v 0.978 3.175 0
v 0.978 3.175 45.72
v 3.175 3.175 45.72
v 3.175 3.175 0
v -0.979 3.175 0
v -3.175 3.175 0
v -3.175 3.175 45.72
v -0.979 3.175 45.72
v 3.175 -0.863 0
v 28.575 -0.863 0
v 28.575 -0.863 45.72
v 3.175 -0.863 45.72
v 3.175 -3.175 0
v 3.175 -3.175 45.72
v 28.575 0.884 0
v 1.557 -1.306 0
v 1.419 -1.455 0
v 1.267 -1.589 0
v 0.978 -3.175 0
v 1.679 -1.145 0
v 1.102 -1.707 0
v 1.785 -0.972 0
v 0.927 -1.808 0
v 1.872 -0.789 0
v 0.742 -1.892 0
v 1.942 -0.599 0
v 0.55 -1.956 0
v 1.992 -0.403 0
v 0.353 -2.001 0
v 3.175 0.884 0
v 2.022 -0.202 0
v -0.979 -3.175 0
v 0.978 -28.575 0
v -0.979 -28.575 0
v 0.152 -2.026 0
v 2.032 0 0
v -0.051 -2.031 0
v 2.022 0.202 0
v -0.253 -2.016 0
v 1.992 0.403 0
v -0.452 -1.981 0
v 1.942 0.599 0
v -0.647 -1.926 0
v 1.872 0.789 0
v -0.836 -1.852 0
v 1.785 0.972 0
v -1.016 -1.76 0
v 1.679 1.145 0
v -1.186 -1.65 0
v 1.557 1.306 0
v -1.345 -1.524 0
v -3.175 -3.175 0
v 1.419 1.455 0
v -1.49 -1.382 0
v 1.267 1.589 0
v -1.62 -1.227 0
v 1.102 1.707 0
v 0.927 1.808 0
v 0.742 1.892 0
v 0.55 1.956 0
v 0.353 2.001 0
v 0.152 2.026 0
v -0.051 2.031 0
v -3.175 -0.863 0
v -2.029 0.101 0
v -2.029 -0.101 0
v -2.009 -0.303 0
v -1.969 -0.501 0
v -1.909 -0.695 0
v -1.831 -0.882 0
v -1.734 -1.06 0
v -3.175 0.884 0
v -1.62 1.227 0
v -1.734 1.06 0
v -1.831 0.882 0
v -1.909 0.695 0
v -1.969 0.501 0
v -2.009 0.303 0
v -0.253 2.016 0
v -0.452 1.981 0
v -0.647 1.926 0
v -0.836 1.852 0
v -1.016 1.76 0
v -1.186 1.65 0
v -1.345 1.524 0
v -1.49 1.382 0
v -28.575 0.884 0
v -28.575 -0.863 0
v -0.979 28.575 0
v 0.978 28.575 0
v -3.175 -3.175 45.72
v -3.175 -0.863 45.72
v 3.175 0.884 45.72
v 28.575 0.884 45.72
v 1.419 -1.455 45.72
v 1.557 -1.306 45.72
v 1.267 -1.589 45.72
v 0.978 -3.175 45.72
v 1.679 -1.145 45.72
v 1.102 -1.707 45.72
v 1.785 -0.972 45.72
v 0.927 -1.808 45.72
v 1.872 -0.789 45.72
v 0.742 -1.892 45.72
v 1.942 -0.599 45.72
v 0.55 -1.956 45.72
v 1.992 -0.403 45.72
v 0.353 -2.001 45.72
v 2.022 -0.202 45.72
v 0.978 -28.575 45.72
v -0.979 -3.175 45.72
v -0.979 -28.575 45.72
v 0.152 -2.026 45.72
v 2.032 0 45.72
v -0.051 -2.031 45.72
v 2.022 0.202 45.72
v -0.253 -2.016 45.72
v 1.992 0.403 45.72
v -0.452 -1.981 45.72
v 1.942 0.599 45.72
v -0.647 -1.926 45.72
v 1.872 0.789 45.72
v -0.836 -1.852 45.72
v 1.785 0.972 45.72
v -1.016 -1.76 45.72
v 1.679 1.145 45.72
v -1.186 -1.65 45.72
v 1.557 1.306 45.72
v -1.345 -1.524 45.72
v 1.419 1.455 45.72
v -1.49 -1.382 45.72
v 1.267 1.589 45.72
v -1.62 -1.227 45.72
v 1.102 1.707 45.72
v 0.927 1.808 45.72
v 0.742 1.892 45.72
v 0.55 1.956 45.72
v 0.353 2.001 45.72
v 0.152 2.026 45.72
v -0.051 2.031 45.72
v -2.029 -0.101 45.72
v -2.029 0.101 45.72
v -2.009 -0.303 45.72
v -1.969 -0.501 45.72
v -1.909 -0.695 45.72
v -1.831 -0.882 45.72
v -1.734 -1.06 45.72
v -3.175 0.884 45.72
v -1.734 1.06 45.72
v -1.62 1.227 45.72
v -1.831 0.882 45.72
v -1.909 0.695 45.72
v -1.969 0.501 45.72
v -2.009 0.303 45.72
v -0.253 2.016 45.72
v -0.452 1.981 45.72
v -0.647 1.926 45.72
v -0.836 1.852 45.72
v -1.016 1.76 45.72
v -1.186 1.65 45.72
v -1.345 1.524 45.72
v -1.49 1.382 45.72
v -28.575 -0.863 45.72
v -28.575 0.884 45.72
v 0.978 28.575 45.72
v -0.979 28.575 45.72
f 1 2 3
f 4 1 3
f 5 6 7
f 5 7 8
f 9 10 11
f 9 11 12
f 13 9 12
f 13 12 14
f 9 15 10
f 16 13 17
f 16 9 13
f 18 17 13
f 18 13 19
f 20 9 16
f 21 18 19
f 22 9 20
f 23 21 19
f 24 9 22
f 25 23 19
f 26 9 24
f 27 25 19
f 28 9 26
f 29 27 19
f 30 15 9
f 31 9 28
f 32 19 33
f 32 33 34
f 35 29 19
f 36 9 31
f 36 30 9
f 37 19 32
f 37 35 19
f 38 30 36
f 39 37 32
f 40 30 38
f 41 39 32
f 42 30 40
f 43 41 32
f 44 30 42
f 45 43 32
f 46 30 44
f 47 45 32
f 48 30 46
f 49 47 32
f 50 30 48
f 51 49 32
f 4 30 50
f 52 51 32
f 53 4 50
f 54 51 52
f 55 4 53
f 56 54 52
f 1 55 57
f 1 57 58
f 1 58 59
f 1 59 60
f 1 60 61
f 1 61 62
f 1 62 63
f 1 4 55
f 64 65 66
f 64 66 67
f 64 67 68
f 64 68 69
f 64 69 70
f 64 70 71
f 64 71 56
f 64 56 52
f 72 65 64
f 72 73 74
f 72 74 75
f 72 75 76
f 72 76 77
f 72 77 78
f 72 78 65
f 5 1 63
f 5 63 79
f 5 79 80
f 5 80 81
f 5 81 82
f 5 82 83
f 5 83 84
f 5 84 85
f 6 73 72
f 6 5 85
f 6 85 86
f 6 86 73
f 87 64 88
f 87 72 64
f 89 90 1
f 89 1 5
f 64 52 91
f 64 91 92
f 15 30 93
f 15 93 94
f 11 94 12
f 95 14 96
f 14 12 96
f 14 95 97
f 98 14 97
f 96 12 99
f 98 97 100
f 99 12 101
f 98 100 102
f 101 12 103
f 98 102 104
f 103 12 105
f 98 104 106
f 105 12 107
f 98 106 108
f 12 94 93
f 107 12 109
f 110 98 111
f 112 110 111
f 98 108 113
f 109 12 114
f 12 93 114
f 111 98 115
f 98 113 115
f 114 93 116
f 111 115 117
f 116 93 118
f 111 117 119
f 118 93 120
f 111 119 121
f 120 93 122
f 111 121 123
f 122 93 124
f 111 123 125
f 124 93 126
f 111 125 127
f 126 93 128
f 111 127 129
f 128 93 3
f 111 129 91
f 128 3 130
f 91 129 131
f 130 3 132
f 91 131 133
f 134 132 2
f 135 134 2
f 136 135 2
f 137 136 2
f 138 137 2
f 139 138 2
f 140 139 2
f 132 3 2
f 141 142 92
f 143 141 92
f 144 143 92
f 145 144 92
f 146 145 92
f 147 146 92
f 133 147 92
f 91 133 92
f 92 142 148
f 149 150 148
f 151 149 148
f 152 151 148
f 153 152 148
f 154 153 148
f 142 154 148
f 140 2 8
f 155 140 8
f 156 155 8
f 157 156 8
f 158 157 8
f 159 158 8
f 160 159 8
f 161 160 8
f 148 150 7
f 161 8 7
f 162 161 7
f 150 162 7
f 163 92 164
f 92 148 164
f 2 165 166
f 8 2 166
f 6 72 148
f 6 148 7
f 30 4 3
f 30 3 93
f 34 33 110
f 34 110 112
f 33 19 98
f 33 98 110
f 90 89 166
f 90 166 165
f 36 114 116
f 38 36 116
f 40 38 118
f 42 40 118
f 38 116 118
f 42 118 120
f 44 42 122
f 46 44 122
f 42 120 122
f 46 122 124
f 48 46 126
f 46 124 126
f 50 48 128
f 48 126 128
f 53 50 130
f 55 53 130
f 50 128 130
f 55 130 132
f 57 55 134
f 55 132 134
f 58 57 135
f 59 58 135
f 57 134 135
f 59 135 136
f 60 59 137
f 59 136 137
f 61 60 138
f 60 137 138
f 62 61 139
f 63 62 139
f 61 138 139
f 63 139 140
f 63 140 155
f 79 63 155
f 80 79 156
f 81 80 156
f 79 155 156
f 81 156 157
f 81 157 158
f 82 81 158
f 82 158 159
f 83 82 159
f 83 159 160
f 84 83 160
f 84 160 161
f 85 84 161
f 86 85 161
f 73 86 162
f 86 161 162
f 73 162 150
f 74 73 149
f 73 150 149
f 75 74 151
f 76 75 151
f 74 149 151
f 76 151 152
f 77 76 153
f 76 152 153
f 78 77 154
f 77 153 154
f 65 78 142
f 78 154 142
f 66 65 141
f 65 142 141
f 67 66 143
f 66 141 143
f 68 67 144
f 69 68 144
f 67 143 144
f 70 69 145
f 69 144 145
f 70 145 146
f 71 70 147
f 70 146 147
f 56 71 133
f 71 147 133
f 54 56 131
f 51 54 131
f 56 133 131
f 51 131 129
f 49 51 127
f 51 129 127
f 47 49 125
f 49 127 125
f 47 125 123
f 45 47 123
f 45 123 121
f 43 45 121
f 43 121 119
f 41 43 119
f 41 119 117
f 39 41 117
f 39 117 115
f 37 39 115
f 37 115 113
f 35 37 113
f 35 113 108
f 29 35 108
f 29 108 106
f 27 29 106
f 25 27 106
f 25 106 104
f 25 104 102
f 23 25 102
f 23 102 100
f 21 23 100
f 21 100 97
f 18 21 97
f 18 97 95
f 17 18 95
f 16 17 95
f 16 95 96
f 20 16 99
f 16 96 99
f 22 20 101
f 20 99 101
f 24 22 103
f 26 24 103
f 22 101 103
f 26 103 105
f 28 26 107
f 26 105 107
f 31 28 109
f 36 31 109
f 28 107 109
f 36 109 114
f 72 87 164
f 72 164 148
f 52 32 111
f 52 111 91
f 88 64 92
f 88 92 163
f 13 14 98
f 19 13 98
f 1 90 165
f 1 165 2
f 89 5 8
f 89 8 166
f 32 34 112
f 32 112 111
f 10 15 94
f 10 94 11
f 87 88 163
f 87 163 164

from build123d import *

# Parameters (mm, degrees)
BOSS_EXTRUDE1_DEPTH = 45.72
SKETCH2_R           = 2.032
CUT_EXTRUDE1_DEPTH  = 45.72


with BuildPart() as part:
    # Sketch1 → Boss-Extrude1 (new body)
    with BuildSketch(Plane.XY):
        Polygon((-3.175, 0.884089911), (-3.175, 3.175), (-0.979194969, 3.175), (-0.979194969, 28.575), (0.978019253, 28.575), (0.978019253, 3.175), (3.175, 3.175), (3.175, 0.884089911), (28.575, 0.884089911), (28.575, -0.86253999), (3.175, -0.86253999), (3.175, -3.175), (0.978019253, -3.175), (0.978019253, -28.575), (-0.979194969, -28.575), (-0.979194969, -3.175), (-3.175, -3.175), (-3.175, -0.86253999), (-28.575, -0.86253999), (-28.575, 0.884089911), align=None)
    extrude(amount=BOSS_EXTRUDE1_DEPTH)

    # Sketch2 → Cut-Extrude1 (cut)
    with BuildSketch(Plane.XY.offset(45.72)):
        Circle(SKETCH2_R)
    extrude(amount=-CUT_EXTRUDE1_DEPTH, mode=Mode.SUBTRACT)


solid = part.part
